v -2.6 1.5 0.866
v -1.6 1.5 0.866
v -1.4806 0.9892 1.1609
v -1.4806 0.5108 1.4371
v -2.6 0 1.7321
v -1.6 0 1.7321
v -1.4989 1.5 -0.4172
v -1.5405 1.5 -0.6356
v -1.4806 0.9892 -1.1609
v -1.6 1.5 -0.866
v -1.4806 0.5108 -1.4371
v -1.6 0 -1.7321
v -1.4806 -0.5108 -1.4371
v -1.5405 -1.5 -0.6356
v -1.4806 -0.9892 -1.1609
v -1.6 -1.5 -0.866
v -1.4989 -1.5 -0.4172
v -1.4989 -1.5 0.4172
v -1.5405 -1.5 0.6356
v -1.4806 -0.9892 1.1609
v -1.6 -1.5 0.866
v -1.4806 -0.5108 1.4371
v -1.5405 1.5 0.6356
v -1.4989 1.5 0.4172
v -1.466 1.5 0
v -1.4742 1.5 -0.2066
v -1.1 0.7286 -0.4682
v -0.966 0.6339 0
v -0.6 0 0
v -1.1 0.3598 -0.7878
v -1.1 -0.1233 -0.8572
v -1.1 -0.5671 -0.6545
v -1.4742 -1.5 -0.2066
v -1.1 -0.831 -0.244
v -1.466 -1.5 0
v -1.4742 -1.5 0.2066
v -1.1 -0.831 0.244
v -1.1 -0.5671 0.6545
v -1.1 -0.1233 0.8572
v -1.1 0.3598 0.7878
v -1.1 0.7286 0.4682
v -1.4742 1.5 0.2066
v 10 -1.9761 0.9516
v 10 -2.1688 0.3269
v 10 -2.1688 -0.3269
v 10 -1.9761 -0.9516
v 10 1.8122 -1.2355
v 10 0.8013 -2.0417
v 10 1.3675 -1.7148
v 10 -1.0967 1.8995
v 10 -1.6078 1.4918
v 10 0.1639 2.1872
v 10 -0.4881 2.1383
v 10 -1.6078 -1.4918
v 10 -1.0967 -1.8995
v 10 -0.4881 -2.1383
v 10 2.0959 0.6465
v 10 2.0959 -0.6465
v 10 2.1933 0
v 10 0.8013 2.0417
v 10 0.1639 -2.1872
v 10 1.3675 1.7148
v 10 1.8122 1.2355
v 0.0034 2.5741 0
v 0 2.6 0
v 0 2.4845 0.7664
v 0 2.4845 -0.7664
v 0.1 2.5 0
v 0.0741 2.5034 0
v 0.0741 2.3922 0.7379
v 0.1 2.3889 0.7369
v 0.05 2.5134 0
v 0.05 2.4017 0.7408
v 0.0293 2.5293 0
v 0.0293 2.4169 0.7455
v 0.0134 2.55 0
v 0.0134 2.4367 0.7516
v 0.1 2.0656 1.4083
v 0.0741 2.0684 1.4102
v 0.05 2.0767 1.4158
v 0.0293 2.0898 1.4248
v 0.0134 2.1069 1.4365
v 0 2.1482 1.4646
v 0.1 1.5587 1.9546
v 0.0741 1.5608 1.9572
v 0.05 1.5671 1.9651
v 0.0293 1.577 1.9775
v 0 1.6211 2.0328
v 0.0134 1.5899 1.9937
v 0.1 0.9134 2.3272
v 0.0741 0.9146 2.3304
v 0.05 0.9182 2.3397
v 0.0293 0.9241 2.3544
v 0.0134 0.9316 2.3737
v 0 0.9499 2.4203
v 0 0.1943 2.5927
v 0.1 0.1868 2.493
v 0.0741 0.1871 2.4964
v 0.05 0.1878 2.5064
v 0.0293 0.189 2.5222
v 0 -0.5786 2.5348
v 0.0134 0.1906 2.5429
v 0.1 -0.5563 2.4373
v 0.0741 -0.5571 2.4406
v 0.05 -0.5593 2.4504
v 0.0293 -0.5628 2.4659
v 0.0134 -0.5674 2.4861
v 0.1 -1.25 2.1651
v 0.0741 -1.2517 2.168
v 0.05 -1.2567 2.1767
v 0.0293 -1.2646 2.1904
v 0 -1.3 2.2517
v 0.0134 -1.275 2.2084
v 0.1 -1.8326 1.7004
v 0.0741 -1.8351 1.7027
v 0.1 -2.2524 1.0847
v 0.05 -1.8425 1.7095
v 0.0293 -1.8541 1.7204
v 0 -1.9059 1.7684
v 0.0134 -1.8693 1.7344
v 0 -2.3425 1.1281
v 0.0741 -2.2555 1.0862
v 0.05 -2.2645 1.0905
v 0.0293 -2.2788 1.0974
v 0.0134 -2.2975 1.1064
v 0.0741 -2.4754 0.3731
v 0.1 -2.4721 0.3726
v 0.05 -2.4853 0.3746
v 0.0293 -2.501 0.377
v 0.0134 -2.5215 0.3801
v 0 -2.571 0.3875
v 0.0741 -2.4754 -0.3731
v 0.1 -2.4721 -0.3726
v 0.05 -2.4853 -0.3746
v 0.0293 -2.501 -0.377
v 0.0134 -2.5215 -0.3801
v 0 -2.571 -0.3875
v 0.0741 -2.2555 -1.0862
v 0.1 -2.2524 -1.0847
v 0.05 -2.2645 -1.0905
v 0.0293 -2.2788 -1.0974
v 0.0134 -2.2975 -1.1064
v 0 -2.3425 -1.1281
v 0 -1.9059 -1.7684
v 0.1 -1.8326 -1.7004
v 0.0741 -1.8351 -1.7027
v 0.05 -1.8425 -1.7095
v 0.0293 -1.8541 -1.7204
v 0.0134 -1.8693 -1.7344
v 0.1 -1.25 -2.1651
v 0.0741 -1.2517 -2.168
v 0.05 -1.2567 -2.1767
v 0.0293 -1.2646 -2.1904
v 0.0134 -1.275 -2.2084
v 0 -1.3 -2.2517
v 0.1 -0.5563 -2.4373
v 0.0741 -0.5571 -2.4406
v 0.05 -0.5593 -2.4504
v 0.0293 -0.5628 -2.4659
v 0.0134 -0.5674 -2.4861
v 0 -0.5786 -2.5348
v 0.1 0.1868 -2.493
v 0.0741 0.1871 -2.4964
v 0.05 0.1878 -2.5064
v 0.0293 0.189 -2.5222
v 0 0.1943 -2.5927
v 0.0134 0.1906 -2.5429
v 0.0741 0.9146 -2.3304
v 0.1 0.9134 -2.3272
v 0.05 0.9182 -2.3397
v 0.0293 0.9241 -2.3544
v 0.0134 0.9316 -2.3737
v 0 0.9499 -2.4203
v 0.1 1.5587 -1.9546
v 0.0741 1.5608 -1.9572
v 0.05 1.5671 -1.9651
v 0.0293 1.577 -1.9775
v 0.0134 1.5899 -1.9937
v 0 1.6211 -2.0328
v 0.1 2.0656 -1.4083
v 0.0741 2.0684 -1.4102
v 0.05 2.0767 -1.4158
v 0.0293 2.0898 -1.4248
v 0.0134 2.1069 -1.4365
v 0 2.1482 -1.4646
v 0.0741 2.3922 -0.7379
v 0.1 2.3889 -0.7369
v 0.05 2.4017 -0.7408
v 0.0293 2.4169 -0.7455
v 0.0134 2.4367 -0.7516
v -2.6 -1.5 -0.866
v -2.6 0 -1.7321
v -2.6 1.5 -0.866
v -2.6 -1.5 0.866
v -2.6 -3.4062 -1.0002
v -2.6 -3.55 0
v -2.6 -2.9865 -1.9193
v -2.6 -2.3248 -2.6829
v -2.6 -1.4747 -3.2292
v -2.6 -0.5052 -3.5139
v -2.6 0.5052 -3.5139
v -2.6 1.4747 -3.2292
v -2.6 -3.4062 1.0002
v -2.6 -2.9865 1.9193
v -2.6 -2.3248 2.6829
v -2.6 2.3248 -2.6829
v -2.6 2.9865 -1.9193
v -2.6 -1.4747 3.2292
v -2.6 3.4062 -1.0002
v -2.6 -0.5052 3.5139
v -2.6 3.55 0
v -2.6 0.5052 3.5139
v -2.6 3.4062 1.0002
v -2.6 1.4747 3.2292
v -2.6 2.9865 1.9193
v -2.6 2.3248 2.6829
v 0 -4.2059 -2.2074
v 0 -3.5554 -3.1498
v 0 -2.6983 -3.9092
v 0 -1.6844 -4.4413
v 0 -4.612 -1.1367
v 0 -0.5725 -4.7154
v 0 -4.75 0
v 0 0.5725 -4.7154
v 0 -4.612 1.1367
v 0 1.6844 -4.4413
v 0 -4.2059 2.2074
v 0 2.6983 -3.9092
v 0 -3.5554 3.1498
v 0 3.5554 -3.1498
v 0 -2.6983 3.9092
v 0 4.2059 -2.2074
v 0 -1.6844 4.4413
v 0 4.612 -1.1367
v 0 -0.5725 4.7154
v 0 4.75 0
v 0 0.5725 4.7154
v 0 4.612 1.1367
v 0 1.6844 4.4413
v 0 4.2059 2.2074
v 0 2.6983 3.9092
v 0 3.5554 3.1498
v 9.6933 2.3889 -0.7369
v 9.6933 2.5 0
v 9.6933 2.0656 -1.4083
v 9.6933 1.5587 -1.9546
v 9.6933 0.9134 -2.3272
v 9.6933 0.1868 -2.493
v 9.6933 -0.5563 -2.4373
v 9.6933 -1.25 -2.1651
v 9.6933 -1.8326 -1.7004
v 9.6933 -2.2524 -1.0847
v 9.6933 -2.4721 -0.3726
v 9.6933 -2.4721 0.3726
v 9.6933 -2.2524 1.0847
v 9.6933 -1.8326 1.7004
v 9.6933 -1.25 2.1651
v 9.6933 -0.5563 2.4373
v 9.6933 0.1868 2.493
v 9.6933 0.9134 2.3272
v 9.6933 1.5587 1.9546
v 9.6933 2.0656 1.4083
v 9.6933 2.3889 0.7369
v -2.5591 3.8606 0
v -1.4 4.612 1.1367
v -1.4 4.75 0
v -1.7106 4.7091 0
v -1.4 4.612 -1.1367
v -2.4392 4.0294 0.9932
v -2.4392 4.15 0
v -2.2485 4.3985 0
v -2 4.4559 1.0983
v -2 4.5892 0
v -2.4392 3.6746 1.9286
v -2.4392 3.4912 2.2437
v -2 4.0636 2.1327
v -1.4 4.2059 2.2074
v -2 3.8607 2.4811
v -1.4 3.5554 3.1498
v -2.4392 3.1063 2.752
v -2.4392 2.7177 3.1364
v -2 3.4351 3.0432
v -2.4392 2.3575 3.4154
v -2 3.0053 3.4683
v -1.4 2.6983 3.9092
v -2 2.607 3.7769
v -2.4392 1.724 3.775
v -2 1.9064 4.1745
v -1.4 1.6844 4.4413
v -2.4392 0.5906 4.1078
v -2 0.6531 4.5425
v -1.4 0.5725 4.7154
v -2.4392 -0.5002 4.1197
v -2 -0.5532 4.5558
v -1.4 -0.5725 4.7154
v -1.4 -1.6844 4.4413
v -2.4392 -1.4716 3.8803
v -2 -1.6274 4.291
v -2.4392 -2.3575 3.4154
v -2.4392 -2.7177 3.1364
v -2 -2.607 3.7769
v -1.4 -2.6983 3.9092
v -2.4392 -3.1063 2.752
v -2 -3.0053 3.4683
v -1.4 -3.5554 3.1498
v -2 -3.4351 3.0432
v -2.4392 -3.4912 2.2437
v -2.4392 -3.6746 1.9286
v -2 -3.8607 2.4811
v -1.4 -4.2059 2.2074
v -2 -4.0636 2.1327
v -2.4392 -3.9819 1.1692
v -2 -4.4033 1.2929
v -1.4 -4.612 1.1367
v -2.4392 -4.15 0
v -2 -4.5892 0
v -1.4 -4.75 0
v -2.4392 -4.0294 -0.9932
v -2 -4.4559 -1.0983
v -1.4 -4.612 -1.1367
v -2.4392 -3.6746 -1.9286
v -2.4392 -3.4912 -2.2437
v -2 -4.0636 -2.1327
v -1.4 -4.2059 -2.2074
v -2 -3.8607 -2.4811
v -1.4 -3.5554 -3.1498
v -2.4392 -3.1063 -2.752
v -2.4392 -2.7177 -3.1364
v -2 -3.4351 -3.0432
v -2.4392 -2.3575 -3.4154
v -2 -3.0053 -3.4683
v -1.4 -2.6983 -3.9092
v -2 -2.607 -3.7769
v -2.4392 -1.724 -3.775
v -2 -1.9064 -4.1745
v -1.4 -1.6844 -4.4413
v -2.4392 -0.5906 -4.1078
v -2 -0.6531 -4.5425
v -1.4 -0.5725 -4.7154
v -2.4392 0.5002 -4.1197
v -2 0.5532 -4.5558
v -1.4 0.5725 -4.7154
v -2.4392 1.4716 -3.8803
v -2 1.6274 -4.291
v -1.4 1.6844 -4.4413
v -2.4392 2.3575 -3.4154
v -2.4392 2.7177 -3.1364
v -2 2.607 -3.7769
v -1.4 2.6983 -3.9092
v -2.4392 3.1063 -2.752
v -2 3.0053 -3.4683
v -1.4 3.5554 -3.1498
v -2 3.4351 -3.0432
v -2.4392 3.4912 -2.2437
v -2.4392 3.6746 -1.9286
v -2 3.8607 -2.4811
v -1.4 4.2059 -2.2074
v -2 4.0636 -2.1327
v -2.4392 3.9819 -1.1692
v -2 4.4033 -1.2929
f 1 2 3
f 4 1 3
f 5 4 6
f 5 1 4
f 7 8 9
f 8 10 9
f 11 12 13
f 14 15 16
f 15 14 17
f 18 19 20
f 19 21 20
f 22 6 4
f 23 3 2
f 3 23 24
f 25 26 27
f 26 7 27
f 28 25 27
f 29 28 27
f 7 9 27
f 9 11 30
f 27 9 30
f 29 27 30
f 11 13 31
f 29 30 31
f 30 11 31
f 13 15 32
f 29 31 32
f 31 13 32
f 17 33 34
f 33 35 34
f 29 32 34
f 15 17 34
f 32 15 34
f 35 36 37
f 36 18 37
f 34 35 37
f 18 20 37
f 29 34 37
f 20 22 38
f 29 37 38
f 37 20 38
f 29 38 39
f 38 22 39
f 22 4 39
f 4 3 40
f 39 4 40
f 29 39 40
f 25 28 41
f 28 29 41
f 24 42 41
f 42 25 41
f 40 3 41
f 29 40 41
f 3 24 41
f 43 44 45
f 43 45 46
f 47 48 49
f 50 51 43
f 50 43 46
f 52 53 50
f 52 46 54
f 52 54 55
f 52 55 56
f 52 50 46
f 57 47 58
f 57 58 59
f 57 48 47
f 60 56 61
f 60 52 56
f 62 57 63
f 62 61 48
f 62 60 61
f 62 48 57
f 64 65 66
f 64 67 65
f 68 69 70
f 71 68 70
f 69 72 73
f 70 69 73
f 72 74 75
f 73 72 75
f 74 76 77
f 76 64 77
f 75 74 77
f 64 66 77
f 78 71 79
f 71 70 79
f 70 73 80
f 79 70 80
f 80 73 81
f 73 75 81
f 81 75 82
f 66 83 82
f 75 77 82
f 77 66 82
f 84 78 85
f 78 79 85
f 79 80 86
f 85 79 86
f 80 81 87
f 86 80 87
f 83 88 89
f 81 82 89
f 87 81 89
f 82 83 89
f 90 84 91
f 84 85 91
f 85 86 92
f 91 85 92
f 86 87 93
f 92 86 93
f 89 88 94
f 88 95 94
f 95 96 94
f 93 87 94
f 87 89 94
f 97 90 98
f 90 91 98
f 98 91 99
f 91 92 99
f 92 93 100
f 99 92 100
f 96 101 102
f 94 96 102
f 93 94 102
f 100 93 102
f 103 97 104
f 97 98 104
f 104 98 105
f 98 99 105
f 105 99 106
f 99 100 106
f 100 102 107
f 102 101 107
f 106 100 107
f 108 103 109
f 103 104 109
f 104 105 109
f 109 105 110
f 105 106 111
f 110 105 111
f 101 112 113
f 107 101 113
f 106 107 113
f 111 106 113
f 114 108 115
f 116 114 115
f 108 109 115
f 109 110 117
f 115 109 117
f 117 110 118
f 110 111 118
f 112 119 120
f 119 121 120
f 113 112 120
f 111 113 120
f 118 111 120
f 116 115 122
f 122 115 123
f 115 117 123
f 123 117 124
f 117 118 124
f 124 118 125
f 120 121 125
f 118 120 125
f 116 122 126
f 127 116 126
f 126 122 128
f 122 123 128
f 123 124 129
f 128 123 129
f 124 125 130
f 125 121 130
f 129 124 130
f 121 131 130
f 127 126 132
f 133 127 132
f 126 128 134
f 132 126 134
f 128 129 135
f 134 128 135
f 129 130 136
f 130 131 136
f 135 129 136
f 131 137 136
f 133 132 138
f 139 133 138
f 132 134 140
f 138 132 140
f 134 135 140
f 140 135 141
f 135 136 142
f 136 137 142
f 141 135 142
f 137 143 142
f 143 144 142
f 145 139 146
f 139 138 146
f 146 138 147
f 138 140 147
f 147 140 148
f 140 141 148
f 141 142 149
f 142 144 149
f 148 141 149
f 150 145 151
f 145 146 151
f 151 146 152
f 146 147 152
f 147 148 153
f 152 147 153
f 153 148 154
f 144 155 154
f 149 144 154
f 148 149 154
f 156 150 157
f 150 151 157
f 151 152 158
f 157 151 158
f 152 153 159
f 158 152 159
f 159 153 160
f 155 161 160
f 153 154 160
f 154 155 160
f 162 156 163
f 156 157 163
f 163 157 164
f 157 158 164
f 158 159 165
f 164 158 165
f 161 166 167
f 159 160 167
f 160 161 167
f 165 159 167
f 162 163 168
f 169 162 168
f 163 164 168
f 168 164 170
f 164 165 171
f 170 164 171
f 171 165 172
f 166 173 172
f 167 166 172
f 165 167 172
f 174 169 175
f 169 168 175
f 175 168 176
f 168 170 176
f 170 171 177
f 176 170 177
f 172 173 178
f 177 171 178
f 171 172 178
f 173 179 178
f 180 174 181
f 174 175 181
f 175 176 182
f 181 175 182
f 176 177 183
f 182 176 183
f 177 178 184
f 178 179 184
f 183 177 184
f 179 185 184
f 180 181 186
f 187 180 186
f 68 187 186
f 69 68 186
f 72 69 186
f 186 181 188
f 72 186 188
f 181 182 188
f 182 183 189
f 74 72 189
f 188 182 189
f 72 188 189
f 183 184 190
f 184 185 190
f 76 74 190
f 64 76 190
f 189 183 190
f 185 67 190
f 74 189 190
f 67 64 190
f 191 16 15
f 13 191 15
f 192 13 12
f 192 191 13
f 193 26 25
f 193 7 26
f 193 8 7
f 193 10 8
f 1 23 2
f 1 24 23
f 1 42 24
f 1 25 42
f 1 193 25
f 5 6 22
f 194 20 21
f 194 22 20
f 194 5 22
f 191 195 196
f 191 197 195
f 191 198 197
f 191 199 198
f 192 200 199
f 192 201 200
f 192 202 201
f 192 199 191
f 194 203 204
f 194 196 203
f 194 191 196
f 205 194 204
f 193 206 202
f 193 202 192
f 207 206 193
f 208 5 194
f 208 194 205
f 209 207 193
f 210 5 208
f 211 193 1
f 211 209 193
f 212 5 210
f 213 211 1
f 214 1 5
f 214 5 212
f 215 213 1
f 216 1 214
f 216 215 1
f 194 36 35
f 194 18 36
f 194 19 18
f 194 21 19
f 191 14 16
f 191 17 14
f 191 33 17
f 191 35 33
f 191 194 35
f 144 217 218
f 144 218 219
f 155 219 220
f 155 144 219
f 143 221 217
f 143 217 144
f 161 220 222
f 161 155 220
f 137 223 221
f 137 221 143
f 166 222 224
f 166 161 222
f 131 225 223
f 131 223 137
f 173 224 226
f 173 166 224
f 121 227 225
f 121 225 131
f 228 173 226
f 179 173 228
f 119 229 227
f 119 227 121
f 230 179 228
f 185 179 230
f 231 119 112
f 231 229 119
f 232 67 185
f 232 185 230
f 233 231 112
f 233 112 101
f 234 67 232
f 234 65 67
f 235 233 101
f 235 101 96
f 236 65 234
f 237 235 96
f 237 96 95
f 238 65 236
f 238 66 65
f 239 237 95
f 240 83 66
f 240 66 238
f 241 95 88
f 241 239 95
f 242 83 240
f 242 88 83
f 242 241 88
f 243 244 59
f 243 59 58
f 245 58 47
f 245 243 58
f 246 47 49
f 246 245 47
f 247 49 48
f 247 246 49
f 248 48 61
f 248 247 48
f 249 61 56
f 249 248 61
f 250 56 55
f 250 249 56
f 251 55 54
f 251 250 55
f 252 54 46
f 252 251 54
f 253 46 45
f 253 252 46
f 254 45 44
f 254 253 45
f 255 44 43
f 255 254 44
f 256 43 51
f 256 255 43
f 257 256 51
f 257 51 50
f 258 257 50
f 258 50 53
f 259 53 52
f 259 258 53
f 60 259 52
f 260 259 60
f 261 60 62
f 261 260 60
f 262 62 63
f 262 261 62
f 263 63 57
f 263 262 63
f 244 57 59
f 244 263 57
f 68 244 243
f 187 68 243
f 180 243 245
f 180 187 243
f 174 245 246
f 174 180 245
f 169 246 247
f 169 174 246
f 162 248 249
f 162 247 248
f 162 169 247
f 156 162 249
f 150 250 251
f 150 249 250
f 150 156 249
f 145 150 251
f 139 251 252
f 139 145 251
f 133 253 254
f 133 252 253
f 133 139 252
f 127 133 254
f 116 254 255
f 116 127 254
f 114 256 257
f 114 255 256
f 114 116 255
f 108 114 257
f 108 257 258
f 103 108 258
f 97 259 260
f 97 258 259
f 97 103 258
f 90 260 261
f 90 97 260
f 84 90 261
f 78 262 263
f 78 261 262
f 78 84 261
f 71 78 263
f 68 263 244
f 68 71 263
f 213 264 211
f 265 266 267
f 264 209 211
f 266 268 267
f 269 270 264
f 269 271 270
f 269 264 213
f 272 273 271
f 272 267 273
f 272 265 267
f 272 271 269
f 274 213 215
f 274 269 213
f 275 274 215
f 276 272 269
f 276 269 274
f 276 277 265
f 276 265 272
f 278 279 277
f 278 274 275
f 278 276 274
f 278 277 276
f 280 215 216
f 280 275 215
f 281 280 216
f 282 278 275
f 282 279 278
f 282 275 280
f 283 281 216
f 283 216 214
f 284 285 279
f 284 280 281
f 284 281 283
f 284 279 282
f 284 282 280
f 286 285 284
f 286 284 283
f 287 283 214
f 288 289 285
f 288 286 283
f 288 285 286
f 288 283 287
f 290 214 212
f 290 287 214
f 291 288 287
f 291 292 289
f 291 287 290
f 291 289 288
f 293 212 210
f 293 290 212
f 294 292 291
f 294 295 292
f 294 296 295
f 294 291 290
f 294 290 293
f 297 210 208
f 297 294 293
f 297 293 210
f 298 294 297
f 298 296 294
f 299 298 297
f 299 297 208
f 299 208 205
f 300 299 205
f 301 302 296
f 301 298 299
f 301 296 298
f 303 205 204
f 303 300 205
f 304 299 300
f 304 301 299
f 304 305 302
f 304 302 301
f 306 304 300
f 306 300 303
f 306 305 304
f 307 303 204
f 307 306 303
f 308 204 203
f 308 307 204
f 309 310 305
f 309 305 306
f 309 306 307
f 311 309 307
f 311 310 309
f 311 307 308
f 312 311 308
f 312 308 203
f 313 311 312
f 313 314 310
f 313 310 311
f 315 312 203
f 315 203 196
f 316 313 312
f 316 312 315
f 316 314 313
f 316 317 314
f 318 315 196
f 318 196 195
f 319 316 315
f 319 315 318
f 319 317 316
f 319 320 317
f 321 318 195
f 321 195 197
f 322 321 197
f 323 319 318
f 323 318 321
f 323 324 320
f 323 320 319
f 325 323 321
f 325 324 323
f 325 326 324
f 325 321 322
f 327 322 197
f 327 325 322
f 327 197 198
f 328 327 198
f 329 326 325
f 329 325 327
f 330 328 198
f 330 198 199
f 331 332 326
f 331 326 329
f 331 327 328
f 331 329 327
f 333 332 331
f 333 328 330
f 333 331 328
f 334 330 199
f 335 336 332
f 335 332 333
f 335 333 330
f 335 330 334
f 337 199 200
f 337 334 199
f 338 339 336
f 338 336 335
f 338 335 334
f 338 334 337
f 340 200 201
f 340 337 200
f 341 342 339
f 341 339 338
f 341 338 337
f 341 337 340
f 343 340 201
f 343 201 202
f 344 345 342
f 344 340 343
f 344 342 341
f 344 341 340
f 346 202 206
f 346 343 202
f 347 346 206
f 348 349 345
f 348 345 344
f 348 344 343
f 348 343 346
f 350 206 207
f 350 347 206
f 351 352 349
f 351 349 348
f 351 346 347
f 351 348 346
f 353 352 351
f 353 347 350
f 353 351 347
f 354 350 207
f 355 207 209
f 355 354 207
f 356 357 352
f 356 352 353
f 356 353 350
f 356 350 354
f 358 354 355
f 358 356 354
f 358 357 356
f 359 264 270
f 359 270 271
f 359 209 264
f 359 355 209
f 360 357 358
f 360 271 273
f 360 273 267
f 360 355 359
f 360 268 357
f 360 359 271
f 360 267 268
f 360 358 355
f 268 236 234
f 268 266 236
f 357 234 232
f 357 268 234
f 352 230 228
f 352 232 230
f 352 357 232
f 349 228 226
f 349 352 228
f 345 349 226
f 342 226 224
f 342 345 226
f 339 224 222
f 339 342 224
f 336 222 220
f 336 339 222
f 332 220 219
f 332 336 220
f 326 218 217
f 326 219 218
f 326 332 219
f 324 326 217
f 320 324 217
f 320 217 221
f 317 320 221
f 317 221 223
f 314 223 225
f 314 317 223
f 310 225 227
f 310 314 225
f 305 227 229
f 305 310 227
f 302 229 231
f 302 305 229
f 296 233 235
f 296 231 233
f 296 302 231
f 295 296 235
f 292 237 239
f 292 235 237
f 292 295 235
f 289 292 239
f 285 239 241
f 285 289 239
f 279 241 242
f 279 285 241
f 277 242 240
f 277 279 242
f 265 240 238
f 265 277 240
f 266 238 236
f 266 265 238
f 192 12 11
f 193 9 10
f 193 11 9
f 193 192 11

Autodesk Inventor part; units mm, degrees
ref_plane "YZ Plane" through (0, 0, 0) normal (1, 0, 0) x (0, 1, 0)
ref_plane "XZ Plane" through (0, 0, 0) normal (0, 1, 0) x (-1, 0, 0)
sketch "Sketch1" plane through (0, 0, 0) normal (0, 0, 1) x (1, 0, 0)
  line L0 (-0.6, 0) -> (10, 0)
  line L1 (10, 0) -> (10, 2.5)
  line L2 (10, 2.5) -> (7, 2.5)
  line L3 (7, 2.5) -> (6.6932, 2.5)
  line L4 (6.6932, 2.5) -> (0, 2.5)
  line L5 (0, 2.5) -> (0, 4.75)
  line L6 (0, 4.75) -> (-2.6, 4.75)
  line L7 (-2.6, 4.75) -> (-2.6, 1.7321)
  line L8 (-2.6, 1.7321) -> (-1.6, 1.7321)
  line L9 (-1.6, 1.7321) -> (-0.6, 0)
  line L10 (-5.12, 0) -> (12.52, 0) projected
  line L11 (0, -0.95) -> (0, 5.7) projected
  line L12 (7, 2.5) -> (0, 2.5) construction
  dimension "d1" = 3
  dimension "d2" = 0.3068
  dimension "d3" = 2.6
  dimension "d4" = 1
  dimension "d5" = 60
  dimension "d6" = 5
  dimension "d7" = 5
  dimension "d8" = 3.4641
  dimension "d9" = 9.5
  dimension "d26" = 10
revolve "Body" add sketch "Sketch1" angle 360 about axis through (-0.6, 0, 0) along (1, 0, 0)
sketch "Sketch2" plane through (-2.6, 0, 0) normal (-1, 0, 0) x (0, 0, 1)
  circle A0 centre (0, 0) radius 1.7321 projected
  line L0 (0, -6.65) -> (0, 6.65) projected
  line L1 (-6.65, 0) -> (6.65, 0) projected
  line L2 (1.7321, 0) -> (0.866, -1.5)
  line L3 (0.866, -1.5) -> (-0.866, -1.5)
  line L4 (-0.866, -1.5) -> (-1.7321, 0)
  line L5 (-1.7321, 0) -> (-0.866, 1.5)
  line L6 (-0.866, 1.5) -> (0.866, 1.5)
  line L7 (0.866, 1.5) -> (1.7321, 0)
extrude "Slot" add sketch "Sketch2" against normal up to next contours L7 A0 | A0 L2 | L6 L0 A0 | A0 L0 L3 | L0 L6 A0 | A0 L3 L0 | L4 A0 | A0 L5
fillet "Fillet1" radius 1.2 1 edges at (-2.6, -4.75, 0)
chamfer "Chamfer1" distance 0.3067 distance2 0.3067 1 edges at (10, -2.5, 0) measured on face at (10, -0.7741, -0.6858)
ref_plane "Work Plane1" through (29, 0, 0) normal (0, -1, 0) x (1, 0, 0)
fillet "Fillet2" radius 0.1 1 edges at (0, -2.5, 0)
thread "Thread2" size "M5x0.8" class "6g" standard "ANSI Metric M Profile" full length
equation "\"d15\" = -0.5 * SPD + 0.5 * GD"
equation "\"d16\" = GUL"
equation "\"GD\" = NND"
equation "\"NLG\" = 6"
equation "\"GEL\" = 4.5"
equation "\"KOD\" = 5.7"
equation "\"KOH\" = 1.65"
equation "\"INTI\" = 1.04"
equation "\"GAL\" = 0.61345 * PTC"
equation "\"GUL\" = 0.61345 * PTC"
equation "\"BDM\" = NND"
equation "\"SW\" = 2"
equation "\"RR\" = 1.45"
equation "\"SPD\" = NND - 1.2269 * PTC"
equation "\"R\" = 0.3"
equation "\"TOA\" = 30deg"
equation "\"GD1\" = THREADDIA - 1.2269 * PTC"
equation "\"THREADDIA\" = 3"
equation "\"PTC\" = 0.5"
equation "\"NND\" = 3"
equation "\"KOH1\" = 0.2"
equation "\"E0\" = 2.303"
properties part number "M5x10 Bolt" material "Stainless Steel"
